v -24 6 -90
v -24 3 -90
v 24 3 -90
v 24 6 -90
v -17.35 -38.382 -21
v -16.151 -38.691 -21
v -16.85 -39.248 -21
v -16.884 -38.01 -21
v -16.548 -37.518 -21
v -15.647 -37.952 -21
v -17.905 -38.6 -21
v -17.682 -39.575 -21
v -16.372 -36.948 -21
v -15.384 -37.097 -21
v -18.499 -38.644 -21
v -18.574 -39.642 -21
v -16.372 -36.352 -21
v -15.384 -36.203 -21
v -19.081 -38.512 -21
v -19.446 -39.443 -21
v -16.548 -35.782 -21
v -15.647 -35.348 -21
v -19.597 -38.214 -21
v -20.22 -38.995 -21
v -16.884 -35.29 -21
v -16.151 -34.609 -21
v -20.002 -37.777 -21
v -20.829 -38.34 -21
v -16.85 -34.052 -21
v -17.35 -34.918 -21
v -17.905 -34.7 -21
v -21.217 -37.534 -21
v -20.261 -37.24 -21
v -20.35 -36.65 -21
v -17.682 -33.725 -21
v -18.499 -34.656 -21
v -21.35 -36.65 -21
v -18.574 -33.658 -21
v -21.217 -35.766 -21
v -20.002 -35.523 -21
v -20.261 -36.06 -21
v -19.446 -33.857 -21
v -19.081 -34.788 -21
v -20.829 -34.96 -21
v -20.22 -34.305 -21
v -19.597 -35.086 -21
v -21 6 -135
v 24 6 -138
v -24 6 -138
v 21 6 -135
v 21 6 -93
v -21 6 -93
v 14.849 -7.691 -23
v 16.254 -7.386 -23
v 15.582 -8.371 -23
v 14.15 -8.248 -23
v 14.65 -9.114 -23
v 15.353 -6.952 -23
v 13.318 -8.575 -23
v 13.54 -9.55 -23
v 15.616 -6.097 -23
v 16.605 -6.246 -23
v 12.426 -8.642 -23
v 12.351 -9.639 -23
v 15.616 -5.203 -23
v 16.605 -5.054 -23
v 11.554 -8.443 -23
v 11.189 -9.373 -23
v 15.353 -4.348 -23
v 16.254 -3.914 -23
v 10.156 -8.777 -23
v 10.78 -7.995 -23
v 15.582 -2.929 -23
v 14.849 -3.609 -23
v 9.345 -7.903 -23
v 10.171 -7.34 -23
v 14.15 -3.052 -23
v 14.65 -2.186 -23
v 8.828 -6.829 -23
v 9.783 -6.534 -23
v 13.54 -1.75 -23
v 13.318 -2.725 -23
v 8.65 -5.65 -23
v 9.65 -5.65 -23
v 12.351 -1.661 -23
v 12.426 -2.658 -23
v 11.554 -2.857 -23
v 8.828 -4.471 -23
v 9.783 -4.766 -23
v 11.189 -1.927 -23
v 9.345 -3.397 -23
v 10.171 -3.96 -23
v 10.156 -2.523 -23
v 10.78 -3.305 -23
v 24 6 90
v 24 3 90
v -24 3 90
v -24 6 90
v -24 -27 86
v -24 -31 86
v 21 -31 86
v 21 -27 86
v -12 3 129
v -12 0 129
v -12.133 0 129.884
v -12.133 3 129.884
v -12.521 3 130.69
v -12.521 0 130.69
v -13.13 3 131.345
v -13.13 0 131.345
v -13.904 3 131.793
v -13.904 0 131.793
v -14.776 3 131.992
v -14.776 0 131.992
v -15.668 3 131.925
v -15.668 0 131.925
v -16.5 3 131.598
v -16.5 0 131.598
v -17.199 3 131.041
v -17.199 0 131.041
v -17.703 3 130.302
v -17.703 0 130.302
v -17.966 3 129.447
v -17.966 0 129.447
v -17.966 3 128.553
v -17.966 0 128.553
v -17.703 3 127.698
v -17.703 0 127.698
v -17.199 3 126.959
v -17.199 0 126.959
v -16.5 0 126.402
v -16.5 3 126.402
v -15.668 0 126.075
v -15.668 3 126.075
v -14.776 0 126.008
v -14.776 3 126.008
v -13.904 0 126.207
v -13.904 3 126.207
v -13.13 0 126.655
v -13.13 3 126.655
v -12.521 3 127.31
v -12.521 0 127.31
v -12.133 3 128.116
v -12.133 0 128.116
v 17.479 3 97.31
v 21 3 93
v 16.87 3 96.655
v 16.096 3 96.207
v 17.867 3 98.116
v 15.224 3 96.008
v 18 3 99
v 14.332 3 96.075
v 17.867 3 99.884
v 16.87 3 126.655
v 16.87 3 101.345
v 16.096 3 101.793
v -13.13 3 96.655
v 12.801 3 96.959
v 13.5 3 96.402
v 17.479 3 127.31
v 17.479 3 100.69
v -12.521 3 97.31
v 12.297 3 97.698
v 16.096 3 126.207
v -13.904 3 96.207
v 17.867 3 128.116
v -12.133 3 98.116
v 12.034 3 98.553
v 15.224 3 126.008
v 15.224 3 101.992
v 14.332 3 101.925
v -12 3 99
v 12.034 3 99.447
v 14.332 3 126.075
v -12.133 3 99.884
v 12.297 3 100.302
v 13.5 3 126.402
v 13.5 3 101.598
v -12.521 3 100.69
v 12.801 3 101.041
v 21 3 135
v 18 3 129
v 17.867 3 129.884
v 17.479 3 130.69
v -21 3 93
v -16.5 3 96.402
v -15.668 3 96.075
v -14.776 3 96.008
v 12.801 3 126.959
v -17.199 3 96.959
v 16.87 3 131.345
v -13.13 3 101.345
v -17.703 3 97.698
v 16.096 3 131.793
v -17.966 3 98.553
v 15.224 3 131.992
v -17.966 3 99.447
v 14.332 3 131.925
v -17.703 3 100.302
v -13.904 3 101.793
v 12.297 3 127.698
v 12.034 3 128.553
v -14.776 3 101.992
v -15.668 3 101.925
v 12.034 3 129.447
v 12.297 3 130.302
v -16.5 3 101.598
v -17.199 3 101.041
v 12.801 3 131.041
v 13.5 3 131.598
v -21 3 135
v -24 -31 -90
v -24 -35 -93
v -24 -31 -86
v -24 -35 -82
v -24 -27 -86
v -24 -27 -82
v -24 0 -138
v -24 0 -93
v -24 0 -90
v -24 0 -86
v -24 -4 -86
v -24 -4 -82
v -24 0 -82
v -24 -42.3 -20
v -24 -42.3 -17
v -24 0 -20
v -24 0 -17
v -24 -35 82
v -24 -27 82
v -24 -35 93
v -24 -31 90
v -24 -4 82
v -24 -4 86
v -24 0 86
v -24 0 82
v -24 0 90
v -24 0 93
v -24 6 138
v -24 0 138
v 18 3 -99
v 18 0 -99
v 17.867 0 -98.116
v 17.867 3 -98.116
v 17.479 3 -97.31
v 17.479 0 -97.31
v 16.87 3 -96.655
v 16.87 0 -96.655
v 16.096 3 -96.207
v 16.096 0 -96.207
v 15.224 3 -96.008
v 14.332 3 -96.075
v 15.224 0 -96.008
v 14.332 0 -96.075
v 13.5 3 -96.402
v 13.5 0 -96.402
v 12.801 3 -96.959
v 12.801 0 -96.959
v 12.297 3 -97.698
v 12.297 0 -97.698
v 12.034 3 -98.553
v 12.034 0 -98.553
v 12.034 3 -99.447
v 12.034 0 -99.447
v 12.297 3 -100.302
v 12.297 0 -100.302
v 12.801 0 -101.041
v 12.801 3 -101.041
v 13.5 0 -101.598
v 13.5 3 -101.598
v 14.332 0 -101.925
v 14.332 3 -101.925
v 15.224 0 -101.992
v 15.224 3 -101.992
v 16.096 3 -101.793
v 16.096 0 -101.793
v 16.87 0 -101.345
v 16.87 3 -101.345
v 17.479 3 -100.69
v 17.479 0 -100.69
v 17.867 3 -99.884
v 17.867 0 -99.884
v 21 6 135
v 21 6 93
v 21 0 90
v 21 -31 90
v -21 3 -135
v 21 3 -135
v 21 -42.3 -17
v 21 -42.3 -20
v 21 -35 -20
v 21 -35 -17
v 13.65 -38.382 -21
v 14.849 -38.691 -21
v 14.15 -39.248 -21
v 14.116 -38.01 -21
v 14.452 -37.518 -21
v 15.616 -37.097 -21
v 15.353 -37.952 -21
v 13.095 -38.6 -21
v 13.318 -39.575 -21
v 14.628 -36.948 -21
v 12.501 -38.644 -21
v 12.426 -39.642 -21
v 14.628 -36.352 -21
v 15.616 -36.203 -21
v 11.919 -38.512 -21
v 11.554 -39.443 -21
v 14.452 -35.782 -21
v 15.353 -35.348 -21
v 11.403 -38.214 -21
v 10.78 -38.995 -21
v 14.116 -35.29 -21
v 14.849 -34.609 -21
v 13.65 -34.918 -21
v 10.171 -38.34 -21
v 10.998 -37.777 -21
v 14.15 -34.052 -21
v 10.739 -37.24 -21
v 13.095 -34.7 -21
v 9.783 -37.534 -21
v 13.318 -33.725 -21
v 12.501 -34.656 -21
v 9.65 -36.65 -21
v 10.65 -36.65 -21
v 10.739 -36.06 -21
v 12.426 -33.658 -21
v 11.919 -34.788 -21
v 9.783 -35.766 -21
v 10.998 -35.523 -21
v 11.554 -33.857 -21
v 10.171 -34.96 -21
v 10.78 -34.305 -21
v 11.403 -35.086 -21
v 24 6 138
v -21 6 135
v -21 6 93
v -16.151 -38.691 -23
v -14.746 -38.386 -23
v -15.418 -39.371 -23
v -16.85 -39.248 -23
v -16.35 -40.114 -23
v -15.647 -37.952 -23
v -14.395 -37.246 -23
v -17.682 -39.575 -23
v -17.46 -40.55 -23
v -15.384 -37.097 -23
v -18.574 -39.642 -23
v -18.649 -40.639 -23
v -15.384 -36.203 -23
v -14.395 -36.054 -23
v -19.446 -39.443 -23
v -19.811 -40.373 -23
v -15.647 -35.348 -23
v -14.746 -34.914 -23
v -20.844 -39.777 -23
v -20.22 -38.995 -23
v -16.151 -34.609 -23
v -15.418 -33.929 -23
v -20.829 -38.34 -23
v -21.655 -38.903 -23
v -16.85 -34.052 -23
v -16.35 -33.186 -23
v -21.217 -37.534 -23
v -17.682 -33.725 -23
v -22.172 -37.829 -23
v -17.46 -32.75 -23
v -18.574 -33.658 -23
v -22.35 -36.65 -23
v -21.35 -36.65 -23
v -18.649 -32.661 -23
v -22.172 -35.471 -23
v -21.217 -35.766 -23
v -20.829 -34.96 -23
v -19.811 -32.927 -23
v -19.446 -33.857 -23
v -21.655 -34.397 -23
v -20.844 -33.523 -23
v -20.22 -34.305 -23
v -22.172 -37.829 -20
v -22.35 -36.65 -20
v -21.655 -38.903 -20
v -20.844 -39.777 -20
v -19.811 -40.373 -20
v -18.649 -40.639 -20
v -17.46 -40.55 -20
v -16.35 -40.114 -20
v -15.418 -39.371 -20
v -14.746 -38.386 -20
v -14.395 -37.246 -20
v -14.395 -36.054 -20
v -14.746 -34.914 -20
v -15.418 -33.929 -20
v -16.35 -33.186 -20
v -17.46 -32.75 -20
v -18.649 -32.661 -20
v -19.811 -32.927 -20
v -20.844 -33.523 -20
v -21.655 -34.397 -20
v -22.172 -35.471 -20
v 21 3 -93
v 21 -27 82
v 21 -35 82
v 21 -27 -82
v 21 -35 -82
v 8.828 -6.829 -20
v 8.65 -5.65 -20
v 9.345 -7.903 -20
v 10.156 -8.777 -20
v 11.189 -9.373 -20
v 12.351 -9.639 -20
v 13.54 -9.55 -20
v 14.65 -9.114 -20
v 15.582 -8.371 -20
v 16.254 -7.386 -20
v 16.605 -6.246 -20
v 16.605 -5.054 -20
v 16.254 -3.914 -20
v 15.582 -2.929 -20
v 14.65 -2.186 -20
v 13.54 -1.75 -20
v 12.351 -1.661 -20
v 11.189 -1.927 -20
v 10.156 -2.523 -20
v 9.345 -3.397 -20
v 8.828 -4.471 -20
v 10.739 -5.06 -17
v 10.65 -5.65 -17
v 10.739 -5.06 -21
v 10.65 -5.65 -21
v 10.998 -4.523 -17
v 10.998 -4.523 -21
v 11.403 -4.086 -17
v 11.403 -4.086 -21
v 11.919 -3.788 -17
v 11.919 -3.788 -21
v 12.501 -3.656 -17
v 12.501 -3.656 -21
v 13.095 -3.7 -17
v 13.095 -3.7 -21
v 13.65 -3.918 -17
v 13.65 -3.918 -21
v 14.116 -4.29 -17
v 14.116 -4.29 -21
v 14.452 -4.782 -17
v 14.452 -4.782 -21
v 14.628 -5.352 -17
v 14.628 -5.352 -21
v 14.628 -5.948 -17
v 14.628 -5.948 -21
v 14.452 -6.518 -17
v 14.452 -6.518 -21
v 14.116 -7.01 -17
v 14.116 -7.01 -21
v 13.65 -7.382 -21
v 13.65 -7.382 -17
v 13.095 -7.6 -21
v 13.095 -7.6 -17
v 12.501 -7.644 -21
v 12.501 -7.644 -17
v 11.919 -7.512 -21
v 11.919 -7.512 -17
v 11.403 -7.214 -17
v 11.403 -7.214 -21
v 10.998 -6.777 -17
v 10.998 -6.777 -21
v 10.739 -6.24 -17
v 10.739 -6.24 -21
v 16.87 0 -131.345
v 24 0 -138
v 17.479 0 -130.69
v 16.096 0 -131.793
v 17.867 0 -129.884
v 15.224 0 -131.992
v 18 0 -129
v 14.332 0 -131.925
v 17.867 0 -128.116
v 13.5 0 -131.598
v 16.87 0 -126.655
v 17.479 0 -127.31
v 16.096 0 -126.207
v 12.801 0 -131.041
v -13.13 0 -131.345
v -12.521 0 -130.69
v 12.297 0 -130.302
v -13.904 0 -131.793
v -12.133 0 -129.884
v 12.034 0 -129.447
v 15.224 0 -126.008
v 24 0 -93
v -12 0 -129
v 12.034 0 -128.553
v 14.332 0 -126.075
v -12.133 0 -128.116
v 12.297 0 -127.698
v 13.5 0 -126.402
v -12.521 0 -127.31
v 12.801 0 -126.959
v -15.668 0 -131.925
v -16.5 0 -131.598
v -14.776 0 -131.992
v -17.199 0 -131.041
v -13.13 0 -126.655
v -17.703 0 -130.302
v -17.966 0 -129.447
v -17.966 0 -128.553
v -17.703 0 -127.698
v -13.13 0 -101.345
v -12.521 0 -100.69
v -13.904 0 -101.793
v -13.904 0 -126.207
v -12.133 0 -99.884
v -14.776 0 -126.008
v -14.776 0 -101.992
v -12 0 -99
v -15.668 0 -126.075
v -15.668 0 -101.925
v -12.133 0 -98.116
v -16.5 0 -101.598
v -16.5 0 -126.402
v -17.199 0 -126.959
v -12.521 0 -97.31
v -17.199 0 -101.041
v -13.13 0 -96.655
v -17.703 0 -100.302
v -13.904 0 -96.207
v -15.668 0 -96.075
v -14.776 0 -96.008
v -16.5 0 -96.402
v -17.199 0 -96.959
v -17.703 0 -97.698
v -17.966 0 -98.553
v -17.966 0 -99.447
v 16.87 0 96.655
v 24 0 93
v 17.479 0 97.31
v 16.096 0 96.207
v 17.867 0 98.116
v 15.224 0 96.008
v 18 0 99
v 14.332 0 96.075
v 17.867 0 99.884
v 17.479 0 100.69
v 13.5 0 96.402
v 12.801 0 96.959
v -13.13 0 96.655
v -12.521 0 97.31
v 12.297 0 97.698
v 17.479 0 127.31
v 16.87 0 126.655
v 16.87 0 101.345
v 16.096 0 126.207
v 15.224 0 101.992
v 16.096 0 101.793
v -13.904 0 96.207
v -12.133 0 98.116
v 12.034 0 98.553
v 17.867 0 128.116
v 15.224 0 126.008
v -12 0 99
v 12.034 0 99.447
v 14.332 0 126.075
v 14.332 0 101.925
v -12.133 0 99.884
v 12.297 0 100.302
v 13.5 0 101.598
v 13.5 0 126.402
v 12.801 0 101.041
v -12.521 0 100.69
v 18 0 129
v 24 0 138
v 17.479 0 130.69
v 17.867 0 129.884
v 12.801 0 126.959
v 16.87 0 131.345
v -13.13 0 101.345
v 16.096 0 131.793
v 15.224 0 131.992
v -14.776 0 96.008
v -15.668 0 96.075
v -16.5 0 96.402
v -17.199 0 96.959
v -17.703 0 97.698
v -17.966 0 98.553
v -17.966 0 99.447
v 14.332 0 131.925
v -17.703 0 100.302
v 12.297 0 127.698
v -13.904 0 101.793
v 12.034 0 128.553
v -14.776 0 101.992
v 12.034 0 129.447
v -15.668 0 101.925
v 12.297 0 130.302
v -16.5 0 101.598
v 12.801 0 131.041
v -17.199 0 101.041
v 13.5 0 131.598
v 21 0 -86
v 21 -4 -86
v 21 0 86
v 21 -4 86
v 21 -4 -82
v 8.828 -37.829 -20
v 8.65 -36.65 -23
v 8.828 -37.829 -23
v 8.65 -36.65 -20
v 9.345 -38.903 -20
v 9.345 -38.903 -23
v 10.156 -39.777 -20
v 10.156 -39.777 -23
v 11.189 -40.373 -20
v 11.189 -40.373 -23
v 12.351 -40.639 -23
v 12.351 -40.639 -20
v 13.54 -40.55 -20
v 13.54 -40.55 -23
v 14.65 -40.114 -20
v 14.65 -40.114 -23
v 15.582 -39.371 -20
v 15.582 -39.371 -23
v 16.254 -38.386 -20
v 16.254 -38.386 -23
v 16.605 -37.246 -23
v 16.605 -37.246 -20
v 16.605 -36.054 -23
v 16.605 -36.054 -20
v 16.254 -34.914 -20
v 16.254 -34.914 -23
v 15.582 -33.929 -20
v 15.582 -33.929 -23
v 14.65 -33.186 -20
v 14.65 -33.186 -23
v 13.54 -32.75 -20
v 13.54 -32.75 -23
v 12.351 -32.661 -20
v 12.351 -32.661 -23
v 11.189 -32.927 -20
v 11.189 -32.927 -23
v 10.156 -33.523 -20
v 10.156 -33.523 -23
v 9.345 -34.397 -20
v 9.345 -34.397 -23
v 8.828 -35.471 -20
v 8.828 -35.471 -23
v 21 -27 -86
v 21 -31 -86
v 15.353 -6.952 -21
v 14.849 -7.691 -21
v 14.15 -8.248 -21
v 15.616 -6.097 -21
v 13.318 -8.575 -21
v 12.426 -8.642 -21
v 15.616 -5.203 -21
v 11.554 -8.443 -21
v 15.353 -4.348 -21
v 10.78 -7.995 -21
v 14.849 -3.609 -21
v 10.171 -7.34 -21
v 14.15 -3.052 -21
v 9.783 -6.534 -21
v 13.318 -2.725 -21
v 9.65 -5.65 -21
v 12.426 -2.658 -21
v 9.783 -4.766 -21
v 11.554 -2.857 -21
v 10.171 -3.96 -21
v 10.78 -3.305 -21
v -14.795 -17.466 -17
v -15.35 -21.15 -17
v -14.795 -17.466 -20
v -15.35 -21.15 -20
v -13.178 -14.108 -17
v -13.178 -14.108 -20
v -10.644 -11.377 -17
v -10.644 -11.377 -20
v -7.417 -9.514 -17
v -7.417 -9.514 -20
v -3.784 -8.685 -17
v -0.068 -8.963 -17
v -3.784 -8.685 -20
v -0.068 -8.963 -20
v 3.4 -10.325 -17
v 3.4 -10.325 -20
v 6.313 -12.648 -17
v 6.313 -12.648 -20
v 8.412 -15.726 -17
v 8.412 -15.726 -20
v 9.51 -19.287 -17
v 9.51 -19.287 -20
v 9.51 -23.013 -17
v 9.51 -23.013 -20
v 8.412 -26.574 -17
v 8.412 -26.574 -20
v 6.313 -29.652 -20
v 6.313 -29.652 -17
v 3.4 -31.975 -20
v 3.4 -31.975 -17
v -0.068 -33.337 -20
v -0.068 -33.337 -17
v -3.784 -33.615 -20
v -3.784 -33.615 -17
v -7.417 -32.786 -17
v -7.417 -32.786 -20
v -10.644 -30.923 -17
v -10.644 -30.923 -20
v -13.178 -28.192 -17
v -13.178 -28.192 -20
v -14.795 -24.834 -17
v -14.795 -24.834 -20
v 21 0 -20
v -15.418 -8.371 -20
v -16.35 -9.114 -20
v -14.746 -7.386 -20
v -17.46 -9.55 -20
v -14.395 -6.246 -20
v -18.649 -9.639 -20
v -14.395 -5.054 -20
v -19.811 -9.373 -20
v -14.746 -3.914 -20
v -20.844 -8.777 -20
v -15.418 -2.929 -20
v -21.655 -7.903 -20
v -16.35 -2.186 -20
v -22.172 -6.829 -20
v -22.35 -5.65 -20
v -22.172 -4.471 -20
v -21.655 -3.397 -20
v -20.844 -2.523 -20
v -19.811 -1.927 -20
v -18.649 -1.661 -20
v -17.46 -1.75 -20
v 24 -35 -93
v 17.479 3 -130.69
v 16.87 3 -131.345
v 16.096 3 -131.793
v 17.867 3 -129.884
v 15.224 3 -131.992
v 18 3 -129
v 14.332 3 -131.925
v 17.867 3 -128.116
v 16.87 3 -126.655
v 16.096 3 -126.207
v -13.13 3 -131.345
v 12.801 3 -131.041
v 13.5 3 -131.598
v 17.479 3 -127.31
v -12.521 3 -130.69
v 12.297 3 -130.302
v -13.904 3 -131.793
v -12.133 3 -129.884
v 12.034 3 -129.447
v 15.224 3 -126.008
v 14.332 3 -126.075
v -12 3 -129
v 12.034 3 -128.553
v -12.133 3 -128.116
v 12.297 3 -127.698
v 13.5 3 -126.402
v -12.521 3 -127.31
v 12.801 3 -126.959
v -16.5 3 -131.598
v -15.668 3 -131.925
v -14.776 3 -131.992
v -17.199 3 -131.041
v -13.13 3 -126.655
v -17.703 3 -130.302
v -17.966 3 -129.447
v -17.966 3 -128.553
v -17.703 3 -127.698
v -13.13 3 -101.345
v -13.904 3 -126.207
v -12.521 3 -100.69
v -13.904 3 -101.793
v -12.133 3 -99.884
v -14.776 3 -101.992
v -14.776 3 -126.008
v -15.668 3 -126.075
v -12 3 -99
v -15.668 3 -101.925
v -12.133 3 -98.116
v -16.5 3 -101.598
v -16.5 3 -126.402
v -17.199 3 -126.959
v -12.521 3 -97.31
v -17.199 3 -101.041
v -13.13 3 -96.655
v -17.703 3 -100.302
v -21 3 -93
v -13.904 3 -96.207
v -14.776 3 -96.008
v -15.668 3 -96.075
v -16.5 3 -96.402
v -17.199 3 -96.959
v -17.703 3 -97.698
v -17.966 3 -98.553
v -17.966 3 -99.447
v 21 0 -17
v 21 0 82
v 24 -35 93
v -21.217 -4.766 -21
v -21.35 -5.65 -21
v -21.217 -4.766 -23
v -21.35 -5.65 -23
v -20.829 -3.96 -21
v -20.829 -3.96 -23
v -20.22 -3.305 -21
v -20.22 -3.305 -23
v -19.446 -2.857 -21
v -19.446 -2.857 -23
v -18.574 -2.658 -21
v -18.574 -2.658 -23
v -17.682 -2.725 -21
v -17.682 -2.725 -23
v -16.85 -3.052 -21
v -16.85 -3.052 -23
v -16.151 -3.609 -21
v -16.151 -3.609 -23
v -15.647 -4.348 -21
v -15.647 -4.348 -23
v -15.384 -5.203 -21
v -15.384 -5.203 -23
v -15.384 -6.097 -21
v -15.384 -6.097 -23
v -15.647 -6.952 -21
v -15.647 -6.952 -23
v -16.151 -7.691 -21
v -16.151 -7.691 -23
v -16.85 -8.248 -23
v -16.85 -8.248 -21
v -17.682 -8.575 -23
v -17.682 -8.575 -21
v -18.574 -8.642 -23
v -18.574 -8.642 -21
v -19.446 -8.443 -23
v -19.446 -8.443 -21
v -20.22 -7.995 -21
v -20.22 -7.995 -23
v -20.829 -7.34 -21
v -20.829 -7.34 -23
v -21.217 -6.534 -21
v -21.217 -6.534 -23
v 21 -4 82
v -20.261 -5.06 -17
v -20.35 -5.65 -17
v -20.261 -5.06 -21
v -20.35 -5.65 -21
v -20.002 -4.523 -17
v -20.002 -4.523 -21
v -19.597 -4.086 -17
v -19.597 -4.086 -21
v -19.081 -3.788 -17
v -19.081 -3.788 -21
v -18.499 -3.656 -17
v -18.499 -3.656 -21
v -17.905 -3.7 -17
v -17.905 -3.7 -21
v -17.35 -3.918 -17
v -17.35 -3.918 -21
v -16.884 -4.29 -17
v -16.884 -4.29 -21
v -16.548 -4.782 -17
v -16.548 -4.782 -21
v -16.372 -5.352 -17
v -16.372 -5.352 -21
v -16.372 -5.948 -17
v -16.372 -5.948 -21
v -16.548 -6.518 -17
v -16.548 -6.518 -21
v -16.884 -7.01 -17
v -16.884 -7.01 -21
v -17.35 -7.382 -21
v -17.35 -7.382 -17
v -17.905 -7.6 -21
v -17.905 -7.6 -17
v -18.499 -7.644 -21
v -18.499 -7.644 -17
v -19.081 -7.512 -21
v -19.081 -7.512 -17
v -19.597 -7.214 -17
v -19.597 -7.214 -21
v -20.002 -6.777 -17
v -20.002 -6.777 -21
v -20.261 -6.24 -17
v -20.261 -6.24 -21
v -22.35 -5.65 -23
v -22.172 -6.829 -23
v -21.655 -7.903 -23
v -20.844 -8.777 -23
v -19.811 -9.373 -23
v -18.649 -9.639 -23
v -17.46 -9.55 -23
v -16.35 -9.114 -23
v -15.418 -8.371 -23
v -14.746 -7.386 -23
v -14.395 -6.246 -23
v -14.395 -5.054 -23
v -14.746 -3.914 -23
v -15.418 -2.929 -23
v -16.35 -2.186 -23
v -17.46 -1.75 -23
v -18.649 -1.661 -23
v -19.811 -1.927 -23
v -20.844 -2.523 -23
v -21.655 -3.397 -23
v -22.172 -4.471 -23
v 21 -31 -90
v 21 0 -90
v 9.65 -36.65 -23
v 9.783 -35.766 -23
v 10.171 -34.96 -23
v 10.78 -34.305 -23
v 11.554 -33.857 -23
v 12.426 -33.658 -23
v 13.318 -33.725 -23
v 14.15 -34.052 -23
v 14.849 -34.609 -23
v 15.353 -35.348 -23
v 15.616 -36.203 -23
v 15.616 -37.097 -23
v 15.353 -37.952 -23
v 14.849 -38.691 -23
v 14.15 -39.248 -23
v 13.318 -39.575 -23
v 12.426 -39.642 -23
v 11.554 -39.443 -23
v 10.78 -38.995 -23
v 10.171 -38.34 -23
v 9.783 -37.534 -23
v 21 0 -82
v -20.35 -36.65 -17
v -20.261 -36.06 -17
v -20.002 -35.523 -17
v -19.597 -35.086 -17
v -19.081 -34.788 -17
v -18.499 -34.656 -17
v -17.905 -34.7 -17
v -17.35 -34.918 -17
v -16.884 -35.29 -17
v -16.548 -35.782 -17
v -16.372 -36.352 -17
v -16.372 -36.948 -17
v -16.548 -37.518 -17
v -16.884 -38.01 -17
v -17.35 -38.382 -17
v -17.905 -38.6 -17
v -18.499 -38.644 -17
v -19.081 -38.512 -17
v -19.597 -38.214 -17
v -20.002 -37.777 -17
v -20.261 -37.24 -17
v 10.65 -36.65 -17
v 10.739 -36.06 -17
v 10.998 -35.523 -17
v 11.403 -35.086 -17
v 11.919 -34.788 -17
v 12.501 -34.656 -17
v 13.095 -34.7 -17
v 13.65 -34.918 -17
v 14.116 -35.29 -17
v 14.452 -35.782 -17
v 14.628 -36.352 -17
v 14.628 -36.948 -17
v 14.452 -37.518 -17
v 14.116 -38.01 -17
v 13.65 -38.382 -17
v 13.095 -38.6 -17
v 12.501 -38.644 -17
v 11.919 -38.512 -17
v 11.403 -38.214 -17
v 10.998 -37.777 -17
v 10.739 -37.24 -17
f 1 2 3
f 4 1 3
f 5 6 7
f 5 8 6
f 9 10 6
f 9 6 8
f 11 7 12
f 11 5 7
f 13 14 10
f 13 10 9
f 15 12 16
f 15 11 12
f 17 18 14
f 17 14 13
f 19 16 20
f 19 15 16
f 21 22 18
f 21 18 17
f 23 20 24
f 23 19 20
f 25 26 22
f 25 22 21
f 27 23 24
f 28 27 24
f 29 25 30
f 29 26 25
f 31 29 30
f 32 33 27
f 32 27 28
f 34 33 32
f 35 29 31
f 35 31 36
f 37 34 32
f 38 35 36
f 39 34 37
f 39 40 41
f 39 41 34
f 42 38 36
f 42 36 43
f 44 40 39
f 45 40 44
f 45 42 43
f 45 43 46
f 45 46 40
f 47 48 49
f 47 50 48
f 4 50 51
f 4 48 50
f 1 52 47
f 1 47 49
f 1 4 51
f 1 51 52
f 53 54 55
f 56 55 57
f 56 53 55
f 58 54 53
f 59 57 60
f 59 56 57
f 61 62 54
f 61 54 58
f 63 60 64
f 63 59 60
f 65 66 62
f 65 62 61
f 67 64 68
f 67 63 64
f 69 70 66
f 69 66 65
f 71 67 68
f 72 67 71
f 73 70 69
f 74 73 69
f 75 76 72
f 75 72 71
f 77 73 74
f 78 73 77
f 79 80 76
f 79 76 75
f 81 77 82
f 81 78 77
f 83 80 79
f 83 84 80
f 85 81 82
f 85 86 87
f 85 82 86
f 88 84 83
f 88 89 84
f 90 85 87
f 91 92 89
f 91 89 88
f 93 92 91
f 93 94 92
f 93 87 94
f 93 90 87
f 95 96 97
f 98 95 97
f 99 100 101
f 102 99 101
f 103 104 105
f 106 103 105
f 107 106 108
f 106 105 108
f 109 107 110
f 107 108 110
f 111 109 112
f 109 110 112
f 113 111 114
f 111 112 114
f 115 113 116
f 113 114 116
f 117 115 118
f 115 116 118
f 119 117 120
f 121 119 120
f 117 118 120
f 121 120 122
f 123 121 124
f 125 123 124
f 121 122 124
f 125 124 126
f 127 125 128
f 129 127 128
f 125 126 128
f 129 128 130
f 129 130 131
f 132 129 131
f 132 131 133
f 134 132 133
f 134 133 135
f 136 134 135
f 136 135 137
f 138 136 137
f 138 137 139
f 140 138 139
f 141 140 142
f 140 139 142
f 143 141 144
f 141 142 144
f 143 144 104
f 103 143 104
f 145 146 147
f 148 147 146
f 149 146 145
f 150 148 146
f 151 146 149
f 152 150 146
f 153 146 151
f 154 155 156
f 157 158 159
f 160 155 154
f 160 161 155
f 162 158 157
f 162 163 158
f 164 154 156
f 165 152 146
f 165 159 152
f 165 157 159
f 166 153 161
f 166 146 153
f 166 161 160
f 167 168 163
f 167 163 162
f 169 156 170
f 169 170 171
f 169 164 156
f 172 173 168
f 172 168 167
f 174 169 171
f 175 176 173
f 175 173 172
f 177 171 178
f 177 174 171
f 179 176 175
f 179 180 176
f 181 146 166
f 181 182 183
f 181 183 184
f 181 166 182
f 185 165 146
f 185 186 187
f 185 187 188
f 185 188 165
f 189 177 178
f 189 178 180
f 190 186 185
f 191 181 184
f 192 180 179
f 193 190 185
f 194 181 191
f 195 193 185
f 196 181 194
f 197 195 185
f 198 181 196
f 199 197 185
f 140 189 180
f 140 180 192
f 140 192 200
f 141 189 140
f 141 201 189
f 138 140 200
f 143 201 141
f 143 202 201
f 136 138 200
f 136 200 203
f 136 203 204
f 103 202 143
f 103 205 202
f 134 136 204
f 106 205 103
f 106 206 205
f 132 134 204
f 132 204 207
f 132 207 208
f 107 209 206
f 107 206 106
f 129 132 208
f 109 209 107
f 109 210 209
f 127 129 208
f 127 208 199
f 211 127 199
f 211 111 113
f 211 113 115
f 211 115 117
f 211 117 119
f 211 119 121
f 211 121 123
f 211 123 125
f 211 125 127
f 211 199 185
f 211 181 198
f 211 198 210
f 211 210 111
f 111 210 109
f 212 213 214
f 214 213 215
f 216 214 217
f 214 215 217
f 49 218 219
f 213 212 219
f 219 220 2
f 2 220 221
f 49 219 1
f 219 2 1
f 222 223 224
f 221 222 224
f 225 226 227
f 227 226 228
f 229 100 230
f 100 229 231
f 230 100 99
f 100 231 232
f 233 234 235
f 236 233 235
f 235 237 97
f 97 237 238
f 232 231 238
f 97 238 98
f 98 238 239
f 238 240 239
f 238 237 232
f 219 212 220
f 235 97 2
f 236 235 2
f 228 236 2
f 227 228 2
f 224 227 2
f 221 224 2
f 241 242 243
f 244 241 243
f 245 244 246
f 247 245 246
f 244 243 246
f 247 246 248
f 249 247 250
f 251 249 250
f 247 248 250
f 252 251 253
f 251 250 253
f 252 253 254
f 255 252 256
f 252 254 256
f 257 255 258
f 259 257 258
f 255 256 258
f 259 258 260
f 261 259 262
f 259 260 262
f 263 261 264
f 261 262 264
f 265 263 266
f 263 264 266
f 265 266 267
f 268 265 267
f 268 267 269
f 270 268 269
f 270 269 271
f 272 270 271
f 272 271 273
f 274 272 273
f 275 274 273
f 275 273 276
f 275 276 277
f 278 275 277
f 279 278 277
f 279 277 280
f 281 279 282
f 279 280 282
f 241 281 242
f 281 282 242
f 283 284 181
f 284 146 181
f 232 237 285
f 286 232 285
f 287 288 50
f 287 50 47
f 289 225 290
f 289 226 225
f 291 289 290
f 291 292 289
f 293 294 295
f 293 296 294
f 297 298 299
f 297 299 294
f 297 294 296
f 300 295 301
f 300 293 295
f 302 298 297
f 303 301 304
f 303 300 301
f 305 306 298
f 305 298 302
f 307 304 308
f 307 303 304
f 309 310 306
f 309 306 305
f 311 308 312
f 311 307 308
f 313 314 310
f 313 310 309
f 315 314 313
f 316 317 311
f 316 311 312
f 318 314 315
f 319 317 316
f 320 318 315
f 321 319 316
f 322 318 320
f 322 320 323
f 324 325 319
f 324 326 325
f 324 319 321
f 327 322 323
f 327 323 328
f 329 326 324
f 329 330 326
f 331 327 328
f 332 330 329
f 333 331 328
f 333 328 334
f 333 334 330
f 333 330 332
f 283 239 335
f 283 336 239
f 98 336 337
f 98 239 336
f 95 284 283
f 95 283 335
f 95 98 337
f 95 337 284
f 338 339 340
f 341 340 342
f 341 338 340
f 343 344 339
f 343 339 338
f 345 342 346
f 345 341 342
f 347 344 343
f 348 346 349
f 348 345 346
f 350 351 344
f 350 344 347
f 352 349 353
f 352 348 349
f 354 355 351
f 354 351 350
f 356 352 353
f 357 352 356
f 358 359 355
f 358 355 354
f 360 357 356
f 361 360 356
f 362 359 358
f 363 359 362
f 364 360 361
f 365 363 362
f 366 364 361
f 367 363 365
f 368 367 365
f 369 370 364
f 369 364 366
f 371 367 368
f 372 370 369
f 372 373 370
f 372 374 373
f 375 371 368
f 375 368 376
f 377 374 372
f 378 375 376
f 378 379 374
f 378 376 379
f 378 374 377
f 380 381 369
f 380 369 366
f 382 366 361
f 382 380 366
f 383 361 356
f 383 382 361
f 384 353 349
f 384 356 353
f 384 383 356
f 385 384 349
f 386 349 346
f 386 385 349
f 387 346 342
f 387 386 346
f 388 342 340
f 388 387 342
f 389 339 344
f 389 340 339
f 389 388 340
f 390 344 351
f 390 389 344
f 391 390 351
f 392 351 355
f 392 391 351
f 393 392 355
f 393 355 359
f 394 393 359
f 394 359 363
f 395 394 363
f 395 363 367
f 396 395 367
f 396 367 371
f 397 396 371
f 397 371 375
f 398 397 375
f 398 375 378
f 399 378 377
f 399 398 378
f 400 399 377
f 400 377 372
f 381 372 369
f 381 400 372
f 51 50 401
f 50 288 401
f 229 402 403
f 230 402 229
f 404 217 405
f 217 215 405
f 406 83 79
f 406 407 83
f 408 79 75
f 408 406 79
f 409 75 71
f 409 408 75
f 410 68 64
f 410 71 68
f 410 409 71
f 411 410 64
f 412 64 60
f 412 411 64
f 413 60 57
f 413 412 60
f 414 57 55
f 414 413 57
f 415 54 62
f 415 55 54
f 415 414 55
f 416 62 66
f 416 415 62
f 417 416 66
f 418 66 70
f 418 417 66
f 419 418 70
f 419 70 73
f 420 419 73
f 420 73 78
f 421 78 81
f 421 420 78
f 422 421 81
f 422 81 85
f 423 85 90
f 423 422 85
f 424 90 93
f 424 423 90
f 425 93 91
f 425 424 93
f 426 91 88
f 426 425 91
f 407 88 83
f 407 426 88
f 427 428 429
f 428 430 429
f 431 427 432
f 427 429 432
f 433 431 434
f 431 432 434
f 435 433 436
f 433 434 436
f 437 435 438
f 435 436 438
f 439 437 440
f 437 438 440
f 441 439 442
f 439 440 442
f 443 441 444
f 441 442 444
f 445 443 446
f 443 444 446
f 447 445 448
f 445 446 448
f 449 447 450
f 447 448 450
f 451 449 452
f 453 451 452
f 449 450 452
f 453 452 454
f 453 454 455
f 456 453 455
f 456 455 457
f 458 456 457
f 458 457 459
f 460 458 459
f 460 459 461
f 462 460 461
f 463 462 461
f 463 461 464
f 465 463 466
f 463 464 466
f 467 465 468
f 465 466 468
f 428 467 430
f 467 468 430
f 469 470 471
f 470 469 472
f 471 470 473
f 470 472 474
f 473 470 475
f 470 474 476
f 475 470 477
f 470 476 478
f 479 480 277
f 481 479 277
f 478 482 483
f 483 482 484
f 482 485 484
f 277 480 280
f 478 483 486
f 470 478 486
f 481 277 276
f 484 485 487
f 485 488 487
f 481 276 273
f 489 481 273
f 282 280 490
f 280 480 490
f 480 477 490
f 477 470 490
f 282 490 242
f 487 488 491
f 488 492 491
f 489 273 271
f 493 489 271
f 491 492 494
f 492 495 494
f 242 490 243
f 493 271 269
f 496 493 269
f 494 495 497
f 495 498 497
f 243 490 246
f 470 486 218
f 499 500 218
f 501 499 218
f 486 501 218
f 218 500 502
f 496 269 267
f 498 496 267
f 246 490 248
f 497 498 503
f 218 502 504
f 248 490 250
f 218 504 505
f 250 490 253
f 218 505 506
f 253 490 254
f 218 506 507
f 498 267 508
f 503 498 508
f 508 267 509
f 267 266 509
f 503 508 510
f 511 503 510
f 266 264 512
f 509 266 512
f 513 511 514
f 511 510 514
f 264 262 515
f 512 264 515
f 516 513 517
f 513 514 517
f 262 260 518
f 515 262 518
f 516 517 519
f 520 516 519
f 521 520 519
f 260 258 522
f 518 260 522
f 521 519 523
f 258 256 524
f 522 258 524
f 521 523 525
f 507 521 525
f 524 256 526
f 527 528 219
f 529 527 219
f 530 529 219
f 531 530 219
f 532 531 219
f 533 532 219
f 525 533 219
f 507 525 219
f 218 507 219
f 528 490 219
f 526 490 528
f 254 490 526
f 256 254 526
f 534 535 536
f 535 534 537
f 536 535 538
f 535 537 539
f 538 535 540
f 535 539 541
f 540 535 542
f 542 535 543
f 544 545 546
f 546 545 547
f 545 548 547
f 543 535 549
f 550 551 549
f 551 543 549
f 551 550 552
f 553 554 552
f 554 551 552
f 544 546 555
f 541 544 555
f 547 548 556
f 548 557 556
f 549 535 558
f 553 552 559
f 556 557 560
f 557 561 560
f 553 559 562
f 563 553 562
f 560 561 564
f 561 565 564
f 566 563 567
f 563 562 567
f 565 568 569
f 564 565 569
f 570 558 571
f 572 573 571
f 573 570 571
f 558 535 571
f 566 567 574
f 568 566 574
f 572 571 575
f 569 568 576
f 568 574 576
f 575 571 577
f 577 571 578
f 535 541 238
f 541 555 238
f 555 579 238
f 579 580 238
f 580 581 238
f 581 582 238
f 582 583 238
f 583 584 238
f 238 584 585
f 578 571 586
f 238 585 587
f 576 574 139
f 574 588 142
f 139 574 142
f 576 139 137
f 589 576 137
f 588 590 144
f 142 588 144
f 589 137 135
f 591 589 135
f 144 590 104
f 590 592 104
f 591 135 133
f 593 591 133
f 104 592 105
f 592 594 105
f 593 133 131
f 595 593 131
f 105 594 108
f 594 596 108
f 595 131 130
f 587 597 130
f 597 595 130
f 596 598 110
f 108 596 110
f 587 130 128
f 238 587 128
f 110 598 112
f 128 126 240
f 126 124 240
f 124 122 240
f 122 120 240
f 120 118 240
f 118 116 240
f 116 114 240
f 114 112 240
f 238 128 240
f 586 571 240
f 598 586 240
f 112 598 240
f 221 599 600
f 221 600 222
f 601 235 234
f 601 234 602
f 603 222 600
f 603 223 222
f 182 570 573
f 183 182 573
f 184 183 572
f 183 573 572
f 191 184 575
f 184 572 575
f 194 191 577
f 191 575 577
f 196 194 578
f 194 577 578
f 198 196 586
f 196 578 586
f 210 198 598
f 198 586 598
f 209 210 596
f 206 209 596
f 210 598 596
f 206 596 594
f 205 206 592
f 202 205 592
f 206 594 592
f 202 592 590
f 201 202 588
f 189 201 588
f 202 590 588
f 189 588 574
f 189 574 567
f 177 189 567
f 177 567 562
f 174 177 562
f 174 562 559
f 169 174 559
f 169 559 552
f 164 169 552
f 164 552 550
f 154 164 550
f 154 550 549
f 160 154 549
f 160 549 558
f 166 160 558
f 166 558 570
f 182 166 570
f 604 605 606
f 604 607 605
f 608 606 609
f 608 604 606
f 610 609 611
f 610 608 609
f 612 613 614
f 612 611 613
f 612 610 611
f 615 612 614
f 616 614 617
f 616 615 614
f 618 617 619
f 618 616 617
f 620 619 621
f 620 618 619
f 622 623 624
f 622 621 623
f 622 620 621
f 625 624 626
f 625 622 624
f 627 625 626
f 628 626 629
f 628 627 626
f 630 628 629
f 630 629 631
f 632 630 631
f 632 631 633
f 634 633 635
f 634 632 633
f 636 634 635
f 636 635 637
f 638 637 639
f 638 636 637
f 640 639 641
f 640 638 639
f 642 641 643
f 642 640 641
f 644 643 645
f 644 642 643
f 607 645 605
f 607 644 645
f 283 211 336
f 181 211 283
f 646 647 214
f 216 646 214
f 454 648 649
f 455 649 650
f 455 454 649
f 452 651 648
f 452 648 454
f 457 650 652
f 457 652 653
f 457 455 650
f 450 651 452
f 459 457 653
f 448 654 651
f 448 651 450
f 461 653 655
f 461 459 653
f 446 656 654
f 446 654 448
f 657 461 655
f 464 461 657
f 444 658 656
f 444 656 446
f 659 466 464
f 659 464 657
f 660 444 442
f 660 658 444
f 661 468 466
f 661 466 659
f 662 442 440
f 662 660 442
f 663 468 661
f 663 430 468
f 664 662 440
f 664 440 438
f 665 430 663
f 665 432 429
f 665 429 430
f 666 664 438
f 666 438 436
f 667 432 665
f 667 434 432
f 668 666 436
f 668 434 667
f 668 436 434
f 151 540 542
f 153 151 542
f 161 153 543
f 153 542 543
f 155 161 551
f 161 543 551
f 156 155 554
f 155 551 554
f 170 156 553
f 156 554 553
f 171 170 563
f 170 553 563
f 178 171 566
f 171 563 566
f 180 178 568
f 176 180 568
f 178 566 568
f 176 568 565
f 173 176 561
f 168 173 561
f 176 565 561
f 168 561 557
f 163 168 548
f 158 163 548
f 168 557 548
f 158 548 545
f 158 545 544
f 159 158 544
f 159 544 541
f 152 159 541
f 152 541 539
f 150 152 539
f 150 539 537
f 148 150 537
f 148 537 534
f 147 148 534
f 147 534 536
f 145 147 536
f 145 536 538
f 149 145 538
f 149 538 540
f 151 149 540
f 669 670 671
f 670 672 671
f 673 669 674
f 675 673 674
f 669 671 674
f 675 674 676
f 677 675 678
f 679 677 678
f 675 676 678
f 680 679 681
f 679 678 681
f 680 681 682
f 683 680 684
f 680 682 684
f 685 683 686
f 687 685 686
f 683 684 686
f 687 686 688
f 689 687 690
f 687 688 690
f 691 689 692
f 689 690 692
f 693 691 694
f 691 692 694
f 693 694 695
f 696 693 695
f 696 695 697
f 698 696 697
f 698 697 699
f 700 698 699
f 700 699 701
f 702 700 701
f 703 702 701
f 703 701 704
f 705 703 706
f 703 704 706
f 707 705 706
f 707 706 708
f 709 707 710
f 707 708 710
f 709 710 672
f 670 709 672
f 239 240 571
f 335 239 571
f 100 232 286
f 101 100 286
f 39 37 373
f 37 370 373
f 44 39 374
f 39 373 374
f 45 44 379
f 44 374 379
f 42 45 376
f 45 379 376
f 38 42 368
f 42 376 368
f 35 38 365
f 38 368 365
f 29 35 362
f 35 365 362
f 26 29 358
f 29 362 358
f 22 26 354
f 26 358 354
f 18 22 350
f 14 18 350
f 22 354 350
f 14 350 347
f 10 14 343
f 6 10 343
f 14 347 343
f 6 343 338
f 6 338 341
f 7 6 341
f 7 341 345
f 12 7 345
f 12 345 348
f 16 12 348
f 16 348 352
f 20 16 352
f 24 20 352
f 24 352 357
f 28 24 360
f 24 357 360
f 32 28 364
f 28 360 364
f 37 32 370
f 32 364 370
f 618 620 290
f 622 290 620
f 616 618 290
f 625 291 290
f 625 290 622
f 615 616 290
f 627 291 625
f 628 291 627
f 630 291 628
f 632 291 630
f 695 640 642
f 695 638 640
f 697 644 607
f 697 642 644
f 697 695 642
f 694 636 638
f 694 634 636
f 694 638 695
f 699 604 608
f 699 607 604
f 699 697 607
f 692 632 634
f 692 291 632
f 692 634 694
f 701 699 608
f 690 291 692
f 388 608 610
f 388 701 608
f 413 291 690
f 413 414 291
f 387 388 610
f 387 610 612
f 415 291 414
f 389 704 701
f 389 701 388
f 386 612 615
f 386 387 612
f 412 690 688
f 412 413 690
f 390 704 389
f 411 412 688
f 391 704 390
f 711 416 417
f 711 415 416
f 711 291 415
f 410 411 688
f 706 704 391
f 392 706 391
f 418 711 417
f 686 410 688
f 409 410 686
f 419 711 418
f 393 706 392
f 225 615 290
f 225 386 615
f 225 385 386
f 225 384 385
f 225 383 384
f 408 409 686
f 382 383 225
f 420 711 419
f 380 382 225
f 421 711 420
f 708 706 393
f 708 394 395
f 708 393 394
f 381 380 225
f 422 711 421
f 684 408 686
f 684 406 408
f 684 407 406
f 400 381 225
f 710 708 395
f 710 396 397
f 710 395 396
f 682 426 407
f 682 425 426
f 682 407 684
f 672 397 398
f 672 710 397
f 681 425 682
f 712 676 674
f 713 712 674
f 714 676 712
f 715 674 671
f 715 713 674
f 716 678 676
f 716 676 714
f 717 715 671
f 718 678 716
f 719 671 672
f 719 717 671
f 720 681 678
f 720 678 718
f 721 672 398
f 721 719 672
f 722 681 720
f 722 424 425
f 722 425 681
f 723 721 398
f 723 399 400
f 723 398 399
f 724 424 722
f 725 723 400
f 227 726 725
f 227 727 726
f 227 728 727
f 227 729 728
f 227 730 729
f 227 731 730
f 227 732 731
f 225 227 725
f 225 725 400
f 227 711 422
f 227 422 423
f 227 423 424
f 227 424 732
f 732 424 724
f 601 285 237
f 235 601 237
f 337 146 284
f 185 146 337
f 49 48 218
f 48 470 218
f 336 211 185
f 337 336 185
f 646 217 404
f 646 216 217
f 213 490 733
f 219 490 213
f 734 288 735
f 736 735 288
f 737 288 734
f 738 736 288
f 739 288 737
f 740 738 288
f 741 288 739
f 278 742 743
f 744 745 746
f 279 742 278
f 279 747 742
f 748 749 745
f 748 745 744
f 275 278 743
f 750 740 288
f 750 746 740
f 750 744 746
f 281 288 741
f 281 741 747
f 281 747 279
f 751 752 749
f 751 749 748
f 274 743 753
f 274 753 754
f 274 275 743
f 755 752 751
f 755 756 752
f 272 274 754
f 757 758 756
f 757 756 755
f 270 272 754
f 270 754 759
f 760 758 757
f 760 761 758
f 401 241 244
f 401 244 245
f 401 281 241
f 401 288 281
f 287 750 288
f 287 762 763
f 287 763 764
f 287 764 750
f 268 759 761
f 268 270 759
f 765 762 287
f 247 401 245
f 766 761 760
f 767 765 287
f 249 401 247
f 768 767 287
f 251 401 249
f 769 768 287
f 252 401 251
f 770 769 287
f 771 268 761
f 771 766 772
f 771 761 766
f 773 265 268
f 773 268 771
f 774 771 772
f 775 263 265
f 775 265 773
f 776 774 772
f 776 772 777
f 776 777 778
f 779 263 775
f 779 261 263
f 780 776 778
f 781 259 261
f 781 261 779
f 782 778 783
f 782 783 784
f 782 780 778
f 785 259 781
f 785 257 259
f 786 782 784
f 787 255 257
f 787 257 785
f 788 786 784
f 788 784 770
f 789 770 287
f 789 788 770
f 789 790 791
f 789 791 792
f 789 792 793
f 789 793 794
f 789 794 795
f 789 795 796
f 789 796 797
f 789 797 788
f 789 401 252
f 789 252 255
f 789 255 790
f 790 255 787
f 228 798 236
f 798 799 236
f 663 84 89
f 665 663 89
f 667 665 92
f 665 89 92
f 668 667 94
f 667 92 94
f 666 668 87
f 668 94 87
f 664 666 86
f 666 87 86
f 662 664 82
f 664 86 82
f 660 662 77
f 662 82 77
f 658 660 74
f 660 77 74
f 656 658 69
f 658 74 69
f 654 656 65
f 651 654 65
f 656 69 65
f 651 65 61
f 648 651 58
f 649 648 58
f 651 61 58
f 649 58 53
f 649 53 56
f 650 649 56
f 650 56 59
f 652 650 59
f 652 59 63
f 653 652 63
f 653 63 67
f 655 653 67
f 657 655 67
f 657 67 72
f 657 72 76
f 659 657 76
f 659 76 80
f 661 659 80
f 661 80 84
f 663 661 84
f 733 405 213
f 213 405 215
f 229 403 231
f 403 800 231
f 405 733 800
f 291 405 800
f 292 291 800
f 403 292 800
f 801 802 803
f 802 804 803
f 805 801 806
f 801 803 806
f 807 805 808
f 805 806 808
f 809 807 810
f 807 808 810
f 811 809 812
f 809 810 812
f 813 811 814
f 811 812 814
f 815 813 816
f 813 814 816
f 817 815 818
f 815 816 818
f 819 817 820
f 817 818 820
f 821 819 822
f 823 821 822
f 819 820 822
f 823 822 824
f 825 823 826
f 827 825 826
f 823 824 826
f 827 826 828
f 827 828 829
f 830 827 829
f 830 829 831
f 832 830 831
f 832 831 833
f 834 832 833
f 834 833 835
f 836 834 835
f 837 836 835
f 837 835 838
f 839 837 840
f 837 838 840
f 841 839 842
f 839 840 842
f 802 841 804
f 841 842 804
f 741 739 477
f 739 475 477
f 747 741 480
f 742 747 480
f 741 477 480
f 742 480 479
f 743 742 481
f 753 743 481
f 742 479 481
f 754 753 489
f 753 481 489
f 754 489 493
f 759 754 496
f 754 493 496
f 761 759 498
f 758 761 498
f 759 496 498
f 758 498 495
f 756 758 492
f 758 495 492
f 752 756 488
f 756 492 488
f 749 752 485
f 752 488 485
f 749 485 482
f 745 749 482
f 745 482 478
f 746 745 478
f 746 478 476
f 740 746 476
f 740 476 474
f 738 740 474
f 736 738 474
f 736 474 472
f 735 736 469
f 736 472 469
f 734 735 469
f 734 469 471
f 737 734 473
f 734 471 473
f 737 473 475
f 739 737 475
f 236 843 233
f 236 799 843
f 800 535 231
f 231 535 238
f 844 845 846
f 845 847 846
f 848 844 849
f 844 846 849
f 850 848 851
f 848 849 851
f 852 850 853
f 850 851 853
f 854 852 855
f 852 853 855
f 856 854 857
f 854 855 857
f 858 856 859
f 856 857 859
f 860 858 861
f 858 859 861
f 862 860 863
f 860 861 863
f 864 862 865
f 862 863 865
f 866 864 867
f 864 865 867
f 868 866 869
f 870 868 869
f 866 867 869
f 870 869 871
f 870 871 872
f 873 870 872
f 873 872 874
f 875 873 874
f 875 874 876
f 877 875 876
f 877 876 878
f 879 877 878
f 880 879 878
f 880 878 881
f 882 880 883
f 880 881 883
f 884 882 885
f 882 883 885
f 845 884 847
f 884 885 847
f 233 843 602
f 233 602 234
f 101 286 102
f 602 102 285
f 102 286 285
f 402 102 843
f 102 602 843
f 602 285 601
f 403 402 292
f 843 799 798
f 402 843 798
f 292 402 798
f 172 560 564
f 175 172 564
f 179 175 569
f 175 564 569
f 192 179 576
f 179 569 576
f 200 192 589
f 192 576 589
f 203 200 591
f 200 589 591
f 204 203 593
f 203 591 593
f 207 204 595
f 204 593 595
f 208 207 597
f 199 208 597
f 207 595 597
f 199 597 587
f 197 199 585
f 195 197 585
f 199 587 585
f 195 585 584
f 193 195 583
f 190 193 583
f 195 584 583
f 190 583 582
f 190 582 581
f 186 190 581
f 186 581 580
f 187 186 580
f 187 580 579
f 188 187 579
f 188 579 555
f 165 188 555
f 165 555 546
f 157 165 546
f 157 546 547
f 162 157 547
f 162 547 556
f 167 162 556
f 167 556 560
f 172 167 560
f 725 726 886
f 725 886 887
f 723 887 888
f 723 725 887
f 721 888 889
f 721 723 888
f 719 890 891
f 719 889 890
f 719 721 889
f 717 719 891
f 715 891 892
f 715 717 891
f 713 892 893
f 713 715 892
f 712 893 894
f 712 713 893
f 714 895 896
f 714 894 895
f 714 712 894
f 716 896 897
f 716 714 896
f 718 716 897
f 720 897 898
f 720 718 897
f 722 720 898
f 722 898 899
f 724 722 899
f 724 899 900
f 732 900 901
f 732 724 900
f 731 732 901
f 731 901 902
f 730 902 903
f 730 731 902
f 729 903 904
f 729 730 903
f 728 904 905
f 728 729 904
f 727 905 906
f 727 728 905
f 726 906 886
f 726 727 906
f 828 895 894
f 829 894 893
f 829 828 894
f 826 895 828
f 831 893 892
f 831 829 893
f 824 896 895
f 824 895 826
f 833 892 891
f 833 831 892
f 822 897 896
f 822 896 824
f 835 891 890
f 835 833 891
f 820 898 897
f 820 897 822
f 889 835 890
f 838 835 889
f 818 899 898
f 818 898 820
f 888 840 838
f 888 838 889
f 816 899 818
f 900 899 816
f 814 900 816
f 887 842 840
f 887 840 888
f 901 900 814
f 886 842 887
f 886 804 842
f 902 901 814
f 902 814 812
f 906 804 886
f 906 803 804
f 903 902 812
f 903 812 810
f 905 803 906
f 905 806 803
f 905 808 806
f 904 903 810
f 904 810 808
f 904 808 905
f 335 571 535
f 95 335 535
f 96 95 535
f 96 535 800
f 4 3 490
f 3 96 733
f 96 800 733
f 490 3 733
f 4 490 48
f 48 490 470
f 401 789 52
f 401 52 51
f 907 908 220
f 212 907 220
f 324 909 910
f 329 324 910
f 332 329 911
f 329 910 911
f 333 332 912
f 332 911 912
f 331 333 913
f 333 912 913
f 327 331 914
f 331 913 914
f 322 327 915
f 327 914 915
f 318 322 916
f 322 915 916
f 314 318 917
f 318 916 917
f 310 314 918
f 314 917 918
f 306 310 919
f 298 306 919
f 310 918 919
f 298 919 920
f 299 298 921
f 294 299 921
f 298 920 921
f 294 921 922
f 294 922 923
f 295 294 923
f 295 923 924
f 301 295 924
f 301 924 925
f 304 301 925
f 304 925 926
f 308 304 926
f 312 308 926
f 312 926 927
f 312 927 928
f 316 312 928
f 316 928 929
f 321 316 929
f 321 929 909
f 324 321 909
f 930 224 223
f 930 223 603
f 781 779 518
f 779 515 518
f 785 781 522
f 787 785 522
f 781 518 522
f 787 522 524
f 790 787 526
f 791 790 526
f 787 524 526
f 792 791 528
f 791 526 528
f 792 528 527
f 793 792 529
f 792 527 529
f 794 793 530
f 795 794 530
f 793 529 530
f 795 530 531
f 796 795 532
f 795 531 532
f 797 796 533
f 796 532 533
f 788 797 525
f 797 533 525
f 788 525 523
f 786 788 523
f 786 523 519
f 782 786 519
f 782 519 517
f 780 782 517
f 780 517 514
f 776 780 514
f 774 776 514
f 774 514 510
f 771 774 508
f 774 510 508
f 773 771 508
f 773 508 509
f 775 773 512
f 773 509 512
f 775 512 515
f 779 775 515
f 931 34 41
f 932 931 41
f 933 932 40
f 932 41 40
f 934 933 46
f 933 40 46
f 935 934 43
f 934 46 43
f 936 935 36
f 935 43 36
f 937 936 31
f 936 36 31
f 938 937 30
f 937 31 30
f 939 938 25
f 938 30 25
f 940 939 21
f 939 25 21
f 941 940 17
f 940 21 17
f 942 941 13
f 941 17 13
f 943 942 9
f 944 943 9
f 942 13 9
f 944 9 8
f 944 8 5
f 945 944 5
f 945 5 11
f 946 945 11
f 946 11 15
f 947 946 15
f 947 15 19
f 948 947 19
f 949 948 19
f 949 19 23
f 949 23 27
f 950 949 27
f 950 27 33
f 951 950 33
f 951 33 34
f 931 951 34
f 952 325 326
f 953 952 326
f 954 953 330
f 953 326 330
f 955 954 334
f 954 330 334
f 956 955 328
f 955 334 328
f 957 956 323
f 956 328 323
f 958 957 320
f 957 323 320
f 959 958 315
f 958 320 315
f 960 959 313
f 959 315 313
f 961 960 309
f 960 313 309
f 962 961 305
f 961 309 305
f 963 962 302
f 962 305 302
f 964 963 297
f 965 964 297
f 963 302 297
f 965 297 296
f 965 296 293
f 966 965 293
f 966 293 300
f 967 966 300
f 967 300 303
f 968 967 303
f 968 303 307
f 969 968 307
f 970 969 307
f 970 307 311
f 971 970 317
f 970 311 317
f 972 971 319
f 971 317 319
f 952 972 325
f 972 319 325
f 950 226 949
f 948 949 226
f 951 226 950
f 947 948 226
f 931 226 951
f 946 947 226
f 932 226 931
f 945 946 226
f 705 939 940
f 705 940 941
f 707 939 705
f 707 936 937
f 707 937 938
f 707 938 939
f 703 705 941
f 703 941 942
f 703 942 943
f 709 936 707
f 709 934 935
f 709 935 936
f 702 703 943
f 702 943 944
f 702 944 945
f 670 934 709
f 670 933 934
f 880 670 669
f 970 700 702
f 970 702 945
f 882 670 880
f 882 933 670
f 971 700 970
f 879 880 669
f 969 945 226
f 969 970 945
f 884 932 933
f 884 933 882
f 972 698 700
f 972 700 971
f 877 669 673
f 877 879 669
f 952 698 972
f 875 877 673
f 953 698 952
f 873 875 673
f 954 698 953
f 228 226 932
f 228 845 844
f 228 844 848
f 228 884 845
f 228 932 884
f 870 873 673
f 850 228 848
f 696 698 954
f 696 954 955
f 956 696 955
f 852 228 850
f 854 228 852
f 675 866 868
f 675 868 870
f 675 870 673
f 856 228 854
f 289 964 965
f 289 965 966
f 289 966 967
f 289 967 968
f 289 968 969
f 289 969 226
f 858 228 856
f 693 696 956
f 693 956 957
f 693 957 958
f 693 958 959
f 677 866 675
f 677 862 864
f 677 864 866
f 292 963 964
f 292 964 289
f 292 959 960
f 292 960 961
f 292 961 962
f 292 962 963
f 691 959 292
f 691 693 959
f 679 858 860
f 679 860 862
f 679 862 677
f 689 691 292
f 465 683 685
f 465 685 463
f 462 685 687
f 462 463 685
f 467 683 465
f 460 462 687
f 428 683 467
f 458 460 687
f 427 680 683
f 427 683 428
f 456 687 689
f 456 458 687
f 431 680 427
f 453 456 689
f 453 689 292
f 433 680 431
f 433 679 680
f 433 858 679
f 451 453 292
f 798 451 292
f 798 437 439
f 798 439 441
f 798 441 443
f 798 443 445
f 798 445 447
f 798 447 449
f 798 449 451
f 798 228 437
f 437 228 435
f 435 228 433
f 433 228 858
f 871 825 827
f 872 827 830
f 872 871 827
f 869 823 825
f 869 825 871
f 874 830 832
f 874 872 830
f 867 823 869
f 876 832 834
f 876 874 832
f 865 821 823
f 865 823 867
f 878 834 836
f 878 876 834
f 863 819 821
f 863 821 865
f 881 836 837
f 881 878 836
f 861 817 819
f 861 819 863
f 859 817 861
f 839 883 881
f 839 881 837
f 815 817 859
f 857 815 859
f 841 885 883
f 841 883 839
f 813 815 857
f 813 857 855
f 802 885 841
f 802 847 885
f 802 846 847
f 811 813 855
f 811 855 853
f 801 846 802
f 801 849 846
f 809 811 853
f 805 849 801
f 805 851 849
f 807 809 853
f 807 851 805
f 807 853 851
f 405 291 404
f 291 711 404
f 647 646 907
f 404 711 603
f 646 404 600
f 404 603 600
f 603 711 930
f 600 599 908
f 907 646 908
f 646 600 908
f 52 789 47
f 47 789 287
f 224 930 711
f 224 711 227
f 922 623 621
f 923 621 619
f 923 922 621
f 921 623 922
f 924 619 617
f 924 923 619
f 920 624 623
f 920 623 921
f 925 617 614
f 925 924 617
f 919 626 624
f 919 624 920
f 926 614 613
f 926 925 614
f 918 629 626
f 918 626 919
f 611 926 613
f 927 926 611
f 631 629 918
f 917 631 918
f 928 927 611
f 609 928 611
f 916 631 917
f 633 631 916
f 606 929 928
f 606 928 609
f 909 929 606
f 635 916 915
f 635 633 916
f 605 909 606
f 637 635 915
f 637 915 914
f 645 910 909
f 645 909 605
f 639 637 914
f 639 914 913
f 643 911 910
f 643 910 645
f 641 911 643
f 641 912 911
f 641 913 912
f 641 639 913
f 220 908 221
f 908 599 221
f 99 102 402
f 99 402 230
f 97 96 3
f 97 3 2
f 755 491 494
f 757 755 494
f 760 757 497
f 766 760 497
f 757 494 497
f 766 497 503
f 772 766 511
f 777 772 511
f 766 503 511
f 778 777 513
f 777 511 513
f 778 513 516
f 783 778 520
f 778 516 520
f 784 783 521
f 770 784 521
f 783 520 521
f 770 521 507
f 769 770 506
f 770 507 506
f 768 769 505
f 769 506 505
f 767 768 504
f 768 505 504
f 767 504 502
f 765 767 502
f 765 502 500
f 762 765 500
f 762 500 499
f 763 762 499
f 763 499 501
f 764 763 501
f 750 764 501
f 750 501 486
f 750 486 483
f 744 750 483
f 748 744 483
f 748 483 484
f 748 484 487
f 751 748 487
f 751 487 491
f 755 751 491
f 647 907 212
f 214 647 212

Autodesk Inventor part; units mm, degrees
ref_plane "YZ Plane" through (0, 0, 0) normal (1, 0, 0) x (0, 1, 0)
ref_plane "XZ Plane" through (0, 0, 0) normal (0, 1, 0) x (-1, 0, 0)
ref_plane "XY Plane" through (0, 0, 0) normal (0, 0, 1) x (1, 0, 0)
sketch "Sketch1" plane through (0, 0, 0) normal (0, 1, 0) x (-1, 0, 0)
  line L0 (24, 138) -> (-24, 138)
  line L1 (-24, 138) -> (-24, -138)
  line L2 (-24, -138) -> (24, -138)
  line L3 (24, -138) -> (24, 138)
  point P0 (0, 0)
  dimension "d0" = 48
  dimension "d1" = 276
extrude "Extrusion1" add sketch "Sketch1" along normal blind 3
sketch "Sketch2" plane through (0, 3, 0) normal (0, 1, 0) x (1, 0, 0)
  line L0 (-24, 138) -> (-24, -138) projected
  line L1 (-24, -138) -> (-21, -138)
  line L2 (-21, -138) -> (-21, -90)
  line L3 (-21, -90) -> (-24, -90)
  line L4 (-24, -90) -> (-24, -138)
  line L5 (24, -138) -> (24, 138) projected
  line L6 (-21, -90) -> (24, -90)
  line L7 (24, -90) -> (24, -93)
  line L8 (24, -93) -> (-21, -93)
  line L9 (-21, -93) -> (-21, -90)
  line L10 (-24, -138) -> (24, -138) projected
  line L11 (24, -93) -> (21, -93)
  line L12 (21, -93) -> (21, -138)
  line L13 (21, -138) -> (24, -138)
  line L14 (24, -138) -> (24, -93)
  line L15 (21, -138) -> (-21, -138)
  line L16 (-21, -138) -> (-21, -135)
  line L17 (-21, -135) -> (21, -135)
  line L18 (21, -135) -> (21, -138)
  point P0 (0, 0)
  dimension "d4" = 3
  dimension "d5" = 48
  dimension "d6" = 3
  dimension "d7" = 3
  dimension "d8" = 3
extrude "Extrusion2" add sketch "Sketch2" along normal blind 3 contours L3 L2 L1 L0 | L6 L5 L8 L2 | L2 L17 L12 L10 | L12 L8 L5 L10
mirror "Mirror1" about plane through (0, 0, 0) normal (0, 0, 1) of "Extrusion2"
sketch "Sketch3" plane through (0, 0, 0) normal (0, -1, 0) x (1, 0, 0)
  line L0 (24, -90) -> (-24, -90) projected
  line L1 (24, 138) -> (24, -138) projected
  line L2 (-24, -90) -> (24, -90)
  line L3 (24, -90) -> (24, -93)
  line L4 (24, -93) -> (-24, -93)
  line L5 (-24, -93) -> (-24, -90)
  line L6 (-24, 90) -> (24, 90) projected
  line L7 (24, 90) -> (21, 90)
  line L8 (21, 90) -> (21, -90)
  line L9 (21, -90) -> (24, -90)
  line L10 (24, -90) -> (24, 90)
  line L11 (-24, 90) -> (24, 90)
  line L12 (24, 90) -> (24, 93)
  line L13 (24, 93) -> (-24, 93)
  line L14 (-24, 93) -> (-24, 90)
  point P0 (0, 0)
  dimension "d11" = 3
  dimension "d12" = 3
  dimension "d13" = 3
extrude "Extrusion3" add sketch "Sketch3" along normal blind 35
sketch "Sketch4" plane through (-24, 0, -90) normal (0, 0, 1) x (1, 0, 0)
  line L0 (0, -35) -> (45, -35) projected
  line L1 (45, 0) -> (45, -35) projected
  line L2 (0, -35) -> (45, -35)
  line L3 (45, -35) -> (45, -31)
  line L4 (45, -31) -> (0, -31)
  line L5 (0, -31) -> (0, -35)
  point P0 (24, 0)
  dimension "d16" = 4
extrude "Extrusion4" add sketch "Sketch4" along normal blind 8
sketch "Sketch5" plane through (-24, -31, -90) normal (0, 1, 0) x (1, 0, 0)
  line L0 (0, -8) -> (45, -8) projected
  line L1 (45, 0) -> (45, -8) projected
  line L2 (0, -8) -> (45, -8)
  line L3 (45, -8) -> (45, -4)
  line L4 (45, -4) -> (0, -4)
  line L5 (0, -4) -> (0, -8)
  point P0 (24, -90)
  dimension "d19" = 4
extrude "Extrusion5" add sketch "Sketch5" along normal blind 4
sketch "Sketch6" plane through (0, 0, 0) normal (0, -1, 0) x (1, 0, 0)
  line L0 (21, -86) -> (-24, -86) projected
  line L1 (-24, -82) -> (21, -82)
  line L2 (21, -82) -> (21, -86)
  line L3 (21, -86) -> (-24, -86)
  line L4 (-24, -86) -> (-24, -82)
  point P0 (0, 0)
  dimension "d22" = 4
extrude "Extrusion6" add sketch "Sketch6" along normal blind 4
mirror "Mirror2" about plane through (0, 0, 0) normal (0, 0, 1) of "Extrusion6", "Extrusion5", "Extrusion4"
sketch "Sketch7" plane through (0, 0, 0) normal (0, -1, 0) x (1, 0, 0)
  circle A0 centre (-15, -129) radius 3
  circle A1 centre (15, -129) radius 3
  circle A2 centre (15, -99) radius 3
  circle A3 centre (-15, -99) radius 3
  point P0 (0, 0)
  dimension "d25" = 6
  dimension "d26" = 6
  dimension "d27" = 6
  dimension "d28" = 6
extrude "Extrusion7" cut sketch "Sketch7" against normal blind 4
mirror "Mirror3" about plane through (0, 0, 0) normal (0, 0, 1) of "Extrusion7"
sketch "Sketch8" plane through (0, 0, 0) normal (0, -1, 0) x (1, 0, 0)
  line L0 (21, 82) -> (21, -82) projected
  line L1 (-24, -82) -> (-24, 82) projected
  line L2 (21, -20) -> (-24, -20)
  line L3 (-24, -20) -> (-24, -17)
  line L4 (-24, -17) -> (21, -17)
  line L5 (21, -17) -> (21, -20)
  point P0 (0, 0)
  dimension "d31" = 3
extrude "Extrusion8" add sketch "Sketch8" along normal blind 42.3
sketch "Sketch9" plane through (21, 0, -20) normal (0, 0, -1) x (-1, 0, 0)
  circle A0 centre (39.35, -5.65) radius 4
  circle A1 centre (39.35, -36.65) radius 4
  circle A2 centre (8.35, -5.65) radius 4
  circle A3 centre (8.35, -36.65) radius 4
  point P0 (21, 0)
  dimension "d34" = 8
  dimension "d35" = 8
  dimension "d36" = 8
  dimension "d37" = 8
extrude "Extrusion9" add sketch "Sketch9" along normal blind 3
sketch "Sketch10" plane through (-18.35, -36.65, -23) normal (0, 0, -1) x (-1, 0, 0)
  circle A0 centre (0, 0) radius 3
  circle A1 centre (0, 31) radius 4 projected
  circle A2 centre (0, 31) radius 3
  circle A3 centre (-31, 0) radius 4 projected
  circle A4 centre (-31, 0) radius 3
  circle A5 centre (-31, 31) radius 4 projected
  circle A6 centre (-31, 31) radius 3
  point P0 (-18.35, 36.65)
  dimension "d40" = 6
  dimension "d41" = 6
  dimension "d42" = 6
  dimension "d43" = 6
extrude "Extrusion10" cut sketch "Sketch10" against normal blind 2 contours A0 | A2 | A4 | A6
sketch "Sketch11" plane through (21, 0, -20) normal (0, 0, -1) x (-1, 0, 0)
  circle A0 centre (23.85, -21.15) radius 12.5
  circle A1 centre (39.35, -36.65) radius 3 projected
  circle A2 centre (39.35, -36.65) radius 2
  circle A3 centre (8.35, -36.65) radius 3 projected
  circle A4 centre (8.35, -36.65) radius 2
  circle A5 centre (8.35, -5.65) radius 4 projected
  circle A6 centre (8.35, -5.65) radius 2
  circle A7 centre (39.35, -5.65) radius 4 projected
  circle A8 centre (39.35, -5.65) radius 2
  point P0 (21, 0)
  dimension "d46" = 25
  dimension "d47" = 4
  dimension "d48" = 4
  dimension "d49" = 4
  dimension "d50" = 4
extrude "Extrusion11" cut sketch "Sketch11" along normal mid plane 10 contours A0 | A2 | A4 | A6 | A8
properties part number "carriageEnd"
